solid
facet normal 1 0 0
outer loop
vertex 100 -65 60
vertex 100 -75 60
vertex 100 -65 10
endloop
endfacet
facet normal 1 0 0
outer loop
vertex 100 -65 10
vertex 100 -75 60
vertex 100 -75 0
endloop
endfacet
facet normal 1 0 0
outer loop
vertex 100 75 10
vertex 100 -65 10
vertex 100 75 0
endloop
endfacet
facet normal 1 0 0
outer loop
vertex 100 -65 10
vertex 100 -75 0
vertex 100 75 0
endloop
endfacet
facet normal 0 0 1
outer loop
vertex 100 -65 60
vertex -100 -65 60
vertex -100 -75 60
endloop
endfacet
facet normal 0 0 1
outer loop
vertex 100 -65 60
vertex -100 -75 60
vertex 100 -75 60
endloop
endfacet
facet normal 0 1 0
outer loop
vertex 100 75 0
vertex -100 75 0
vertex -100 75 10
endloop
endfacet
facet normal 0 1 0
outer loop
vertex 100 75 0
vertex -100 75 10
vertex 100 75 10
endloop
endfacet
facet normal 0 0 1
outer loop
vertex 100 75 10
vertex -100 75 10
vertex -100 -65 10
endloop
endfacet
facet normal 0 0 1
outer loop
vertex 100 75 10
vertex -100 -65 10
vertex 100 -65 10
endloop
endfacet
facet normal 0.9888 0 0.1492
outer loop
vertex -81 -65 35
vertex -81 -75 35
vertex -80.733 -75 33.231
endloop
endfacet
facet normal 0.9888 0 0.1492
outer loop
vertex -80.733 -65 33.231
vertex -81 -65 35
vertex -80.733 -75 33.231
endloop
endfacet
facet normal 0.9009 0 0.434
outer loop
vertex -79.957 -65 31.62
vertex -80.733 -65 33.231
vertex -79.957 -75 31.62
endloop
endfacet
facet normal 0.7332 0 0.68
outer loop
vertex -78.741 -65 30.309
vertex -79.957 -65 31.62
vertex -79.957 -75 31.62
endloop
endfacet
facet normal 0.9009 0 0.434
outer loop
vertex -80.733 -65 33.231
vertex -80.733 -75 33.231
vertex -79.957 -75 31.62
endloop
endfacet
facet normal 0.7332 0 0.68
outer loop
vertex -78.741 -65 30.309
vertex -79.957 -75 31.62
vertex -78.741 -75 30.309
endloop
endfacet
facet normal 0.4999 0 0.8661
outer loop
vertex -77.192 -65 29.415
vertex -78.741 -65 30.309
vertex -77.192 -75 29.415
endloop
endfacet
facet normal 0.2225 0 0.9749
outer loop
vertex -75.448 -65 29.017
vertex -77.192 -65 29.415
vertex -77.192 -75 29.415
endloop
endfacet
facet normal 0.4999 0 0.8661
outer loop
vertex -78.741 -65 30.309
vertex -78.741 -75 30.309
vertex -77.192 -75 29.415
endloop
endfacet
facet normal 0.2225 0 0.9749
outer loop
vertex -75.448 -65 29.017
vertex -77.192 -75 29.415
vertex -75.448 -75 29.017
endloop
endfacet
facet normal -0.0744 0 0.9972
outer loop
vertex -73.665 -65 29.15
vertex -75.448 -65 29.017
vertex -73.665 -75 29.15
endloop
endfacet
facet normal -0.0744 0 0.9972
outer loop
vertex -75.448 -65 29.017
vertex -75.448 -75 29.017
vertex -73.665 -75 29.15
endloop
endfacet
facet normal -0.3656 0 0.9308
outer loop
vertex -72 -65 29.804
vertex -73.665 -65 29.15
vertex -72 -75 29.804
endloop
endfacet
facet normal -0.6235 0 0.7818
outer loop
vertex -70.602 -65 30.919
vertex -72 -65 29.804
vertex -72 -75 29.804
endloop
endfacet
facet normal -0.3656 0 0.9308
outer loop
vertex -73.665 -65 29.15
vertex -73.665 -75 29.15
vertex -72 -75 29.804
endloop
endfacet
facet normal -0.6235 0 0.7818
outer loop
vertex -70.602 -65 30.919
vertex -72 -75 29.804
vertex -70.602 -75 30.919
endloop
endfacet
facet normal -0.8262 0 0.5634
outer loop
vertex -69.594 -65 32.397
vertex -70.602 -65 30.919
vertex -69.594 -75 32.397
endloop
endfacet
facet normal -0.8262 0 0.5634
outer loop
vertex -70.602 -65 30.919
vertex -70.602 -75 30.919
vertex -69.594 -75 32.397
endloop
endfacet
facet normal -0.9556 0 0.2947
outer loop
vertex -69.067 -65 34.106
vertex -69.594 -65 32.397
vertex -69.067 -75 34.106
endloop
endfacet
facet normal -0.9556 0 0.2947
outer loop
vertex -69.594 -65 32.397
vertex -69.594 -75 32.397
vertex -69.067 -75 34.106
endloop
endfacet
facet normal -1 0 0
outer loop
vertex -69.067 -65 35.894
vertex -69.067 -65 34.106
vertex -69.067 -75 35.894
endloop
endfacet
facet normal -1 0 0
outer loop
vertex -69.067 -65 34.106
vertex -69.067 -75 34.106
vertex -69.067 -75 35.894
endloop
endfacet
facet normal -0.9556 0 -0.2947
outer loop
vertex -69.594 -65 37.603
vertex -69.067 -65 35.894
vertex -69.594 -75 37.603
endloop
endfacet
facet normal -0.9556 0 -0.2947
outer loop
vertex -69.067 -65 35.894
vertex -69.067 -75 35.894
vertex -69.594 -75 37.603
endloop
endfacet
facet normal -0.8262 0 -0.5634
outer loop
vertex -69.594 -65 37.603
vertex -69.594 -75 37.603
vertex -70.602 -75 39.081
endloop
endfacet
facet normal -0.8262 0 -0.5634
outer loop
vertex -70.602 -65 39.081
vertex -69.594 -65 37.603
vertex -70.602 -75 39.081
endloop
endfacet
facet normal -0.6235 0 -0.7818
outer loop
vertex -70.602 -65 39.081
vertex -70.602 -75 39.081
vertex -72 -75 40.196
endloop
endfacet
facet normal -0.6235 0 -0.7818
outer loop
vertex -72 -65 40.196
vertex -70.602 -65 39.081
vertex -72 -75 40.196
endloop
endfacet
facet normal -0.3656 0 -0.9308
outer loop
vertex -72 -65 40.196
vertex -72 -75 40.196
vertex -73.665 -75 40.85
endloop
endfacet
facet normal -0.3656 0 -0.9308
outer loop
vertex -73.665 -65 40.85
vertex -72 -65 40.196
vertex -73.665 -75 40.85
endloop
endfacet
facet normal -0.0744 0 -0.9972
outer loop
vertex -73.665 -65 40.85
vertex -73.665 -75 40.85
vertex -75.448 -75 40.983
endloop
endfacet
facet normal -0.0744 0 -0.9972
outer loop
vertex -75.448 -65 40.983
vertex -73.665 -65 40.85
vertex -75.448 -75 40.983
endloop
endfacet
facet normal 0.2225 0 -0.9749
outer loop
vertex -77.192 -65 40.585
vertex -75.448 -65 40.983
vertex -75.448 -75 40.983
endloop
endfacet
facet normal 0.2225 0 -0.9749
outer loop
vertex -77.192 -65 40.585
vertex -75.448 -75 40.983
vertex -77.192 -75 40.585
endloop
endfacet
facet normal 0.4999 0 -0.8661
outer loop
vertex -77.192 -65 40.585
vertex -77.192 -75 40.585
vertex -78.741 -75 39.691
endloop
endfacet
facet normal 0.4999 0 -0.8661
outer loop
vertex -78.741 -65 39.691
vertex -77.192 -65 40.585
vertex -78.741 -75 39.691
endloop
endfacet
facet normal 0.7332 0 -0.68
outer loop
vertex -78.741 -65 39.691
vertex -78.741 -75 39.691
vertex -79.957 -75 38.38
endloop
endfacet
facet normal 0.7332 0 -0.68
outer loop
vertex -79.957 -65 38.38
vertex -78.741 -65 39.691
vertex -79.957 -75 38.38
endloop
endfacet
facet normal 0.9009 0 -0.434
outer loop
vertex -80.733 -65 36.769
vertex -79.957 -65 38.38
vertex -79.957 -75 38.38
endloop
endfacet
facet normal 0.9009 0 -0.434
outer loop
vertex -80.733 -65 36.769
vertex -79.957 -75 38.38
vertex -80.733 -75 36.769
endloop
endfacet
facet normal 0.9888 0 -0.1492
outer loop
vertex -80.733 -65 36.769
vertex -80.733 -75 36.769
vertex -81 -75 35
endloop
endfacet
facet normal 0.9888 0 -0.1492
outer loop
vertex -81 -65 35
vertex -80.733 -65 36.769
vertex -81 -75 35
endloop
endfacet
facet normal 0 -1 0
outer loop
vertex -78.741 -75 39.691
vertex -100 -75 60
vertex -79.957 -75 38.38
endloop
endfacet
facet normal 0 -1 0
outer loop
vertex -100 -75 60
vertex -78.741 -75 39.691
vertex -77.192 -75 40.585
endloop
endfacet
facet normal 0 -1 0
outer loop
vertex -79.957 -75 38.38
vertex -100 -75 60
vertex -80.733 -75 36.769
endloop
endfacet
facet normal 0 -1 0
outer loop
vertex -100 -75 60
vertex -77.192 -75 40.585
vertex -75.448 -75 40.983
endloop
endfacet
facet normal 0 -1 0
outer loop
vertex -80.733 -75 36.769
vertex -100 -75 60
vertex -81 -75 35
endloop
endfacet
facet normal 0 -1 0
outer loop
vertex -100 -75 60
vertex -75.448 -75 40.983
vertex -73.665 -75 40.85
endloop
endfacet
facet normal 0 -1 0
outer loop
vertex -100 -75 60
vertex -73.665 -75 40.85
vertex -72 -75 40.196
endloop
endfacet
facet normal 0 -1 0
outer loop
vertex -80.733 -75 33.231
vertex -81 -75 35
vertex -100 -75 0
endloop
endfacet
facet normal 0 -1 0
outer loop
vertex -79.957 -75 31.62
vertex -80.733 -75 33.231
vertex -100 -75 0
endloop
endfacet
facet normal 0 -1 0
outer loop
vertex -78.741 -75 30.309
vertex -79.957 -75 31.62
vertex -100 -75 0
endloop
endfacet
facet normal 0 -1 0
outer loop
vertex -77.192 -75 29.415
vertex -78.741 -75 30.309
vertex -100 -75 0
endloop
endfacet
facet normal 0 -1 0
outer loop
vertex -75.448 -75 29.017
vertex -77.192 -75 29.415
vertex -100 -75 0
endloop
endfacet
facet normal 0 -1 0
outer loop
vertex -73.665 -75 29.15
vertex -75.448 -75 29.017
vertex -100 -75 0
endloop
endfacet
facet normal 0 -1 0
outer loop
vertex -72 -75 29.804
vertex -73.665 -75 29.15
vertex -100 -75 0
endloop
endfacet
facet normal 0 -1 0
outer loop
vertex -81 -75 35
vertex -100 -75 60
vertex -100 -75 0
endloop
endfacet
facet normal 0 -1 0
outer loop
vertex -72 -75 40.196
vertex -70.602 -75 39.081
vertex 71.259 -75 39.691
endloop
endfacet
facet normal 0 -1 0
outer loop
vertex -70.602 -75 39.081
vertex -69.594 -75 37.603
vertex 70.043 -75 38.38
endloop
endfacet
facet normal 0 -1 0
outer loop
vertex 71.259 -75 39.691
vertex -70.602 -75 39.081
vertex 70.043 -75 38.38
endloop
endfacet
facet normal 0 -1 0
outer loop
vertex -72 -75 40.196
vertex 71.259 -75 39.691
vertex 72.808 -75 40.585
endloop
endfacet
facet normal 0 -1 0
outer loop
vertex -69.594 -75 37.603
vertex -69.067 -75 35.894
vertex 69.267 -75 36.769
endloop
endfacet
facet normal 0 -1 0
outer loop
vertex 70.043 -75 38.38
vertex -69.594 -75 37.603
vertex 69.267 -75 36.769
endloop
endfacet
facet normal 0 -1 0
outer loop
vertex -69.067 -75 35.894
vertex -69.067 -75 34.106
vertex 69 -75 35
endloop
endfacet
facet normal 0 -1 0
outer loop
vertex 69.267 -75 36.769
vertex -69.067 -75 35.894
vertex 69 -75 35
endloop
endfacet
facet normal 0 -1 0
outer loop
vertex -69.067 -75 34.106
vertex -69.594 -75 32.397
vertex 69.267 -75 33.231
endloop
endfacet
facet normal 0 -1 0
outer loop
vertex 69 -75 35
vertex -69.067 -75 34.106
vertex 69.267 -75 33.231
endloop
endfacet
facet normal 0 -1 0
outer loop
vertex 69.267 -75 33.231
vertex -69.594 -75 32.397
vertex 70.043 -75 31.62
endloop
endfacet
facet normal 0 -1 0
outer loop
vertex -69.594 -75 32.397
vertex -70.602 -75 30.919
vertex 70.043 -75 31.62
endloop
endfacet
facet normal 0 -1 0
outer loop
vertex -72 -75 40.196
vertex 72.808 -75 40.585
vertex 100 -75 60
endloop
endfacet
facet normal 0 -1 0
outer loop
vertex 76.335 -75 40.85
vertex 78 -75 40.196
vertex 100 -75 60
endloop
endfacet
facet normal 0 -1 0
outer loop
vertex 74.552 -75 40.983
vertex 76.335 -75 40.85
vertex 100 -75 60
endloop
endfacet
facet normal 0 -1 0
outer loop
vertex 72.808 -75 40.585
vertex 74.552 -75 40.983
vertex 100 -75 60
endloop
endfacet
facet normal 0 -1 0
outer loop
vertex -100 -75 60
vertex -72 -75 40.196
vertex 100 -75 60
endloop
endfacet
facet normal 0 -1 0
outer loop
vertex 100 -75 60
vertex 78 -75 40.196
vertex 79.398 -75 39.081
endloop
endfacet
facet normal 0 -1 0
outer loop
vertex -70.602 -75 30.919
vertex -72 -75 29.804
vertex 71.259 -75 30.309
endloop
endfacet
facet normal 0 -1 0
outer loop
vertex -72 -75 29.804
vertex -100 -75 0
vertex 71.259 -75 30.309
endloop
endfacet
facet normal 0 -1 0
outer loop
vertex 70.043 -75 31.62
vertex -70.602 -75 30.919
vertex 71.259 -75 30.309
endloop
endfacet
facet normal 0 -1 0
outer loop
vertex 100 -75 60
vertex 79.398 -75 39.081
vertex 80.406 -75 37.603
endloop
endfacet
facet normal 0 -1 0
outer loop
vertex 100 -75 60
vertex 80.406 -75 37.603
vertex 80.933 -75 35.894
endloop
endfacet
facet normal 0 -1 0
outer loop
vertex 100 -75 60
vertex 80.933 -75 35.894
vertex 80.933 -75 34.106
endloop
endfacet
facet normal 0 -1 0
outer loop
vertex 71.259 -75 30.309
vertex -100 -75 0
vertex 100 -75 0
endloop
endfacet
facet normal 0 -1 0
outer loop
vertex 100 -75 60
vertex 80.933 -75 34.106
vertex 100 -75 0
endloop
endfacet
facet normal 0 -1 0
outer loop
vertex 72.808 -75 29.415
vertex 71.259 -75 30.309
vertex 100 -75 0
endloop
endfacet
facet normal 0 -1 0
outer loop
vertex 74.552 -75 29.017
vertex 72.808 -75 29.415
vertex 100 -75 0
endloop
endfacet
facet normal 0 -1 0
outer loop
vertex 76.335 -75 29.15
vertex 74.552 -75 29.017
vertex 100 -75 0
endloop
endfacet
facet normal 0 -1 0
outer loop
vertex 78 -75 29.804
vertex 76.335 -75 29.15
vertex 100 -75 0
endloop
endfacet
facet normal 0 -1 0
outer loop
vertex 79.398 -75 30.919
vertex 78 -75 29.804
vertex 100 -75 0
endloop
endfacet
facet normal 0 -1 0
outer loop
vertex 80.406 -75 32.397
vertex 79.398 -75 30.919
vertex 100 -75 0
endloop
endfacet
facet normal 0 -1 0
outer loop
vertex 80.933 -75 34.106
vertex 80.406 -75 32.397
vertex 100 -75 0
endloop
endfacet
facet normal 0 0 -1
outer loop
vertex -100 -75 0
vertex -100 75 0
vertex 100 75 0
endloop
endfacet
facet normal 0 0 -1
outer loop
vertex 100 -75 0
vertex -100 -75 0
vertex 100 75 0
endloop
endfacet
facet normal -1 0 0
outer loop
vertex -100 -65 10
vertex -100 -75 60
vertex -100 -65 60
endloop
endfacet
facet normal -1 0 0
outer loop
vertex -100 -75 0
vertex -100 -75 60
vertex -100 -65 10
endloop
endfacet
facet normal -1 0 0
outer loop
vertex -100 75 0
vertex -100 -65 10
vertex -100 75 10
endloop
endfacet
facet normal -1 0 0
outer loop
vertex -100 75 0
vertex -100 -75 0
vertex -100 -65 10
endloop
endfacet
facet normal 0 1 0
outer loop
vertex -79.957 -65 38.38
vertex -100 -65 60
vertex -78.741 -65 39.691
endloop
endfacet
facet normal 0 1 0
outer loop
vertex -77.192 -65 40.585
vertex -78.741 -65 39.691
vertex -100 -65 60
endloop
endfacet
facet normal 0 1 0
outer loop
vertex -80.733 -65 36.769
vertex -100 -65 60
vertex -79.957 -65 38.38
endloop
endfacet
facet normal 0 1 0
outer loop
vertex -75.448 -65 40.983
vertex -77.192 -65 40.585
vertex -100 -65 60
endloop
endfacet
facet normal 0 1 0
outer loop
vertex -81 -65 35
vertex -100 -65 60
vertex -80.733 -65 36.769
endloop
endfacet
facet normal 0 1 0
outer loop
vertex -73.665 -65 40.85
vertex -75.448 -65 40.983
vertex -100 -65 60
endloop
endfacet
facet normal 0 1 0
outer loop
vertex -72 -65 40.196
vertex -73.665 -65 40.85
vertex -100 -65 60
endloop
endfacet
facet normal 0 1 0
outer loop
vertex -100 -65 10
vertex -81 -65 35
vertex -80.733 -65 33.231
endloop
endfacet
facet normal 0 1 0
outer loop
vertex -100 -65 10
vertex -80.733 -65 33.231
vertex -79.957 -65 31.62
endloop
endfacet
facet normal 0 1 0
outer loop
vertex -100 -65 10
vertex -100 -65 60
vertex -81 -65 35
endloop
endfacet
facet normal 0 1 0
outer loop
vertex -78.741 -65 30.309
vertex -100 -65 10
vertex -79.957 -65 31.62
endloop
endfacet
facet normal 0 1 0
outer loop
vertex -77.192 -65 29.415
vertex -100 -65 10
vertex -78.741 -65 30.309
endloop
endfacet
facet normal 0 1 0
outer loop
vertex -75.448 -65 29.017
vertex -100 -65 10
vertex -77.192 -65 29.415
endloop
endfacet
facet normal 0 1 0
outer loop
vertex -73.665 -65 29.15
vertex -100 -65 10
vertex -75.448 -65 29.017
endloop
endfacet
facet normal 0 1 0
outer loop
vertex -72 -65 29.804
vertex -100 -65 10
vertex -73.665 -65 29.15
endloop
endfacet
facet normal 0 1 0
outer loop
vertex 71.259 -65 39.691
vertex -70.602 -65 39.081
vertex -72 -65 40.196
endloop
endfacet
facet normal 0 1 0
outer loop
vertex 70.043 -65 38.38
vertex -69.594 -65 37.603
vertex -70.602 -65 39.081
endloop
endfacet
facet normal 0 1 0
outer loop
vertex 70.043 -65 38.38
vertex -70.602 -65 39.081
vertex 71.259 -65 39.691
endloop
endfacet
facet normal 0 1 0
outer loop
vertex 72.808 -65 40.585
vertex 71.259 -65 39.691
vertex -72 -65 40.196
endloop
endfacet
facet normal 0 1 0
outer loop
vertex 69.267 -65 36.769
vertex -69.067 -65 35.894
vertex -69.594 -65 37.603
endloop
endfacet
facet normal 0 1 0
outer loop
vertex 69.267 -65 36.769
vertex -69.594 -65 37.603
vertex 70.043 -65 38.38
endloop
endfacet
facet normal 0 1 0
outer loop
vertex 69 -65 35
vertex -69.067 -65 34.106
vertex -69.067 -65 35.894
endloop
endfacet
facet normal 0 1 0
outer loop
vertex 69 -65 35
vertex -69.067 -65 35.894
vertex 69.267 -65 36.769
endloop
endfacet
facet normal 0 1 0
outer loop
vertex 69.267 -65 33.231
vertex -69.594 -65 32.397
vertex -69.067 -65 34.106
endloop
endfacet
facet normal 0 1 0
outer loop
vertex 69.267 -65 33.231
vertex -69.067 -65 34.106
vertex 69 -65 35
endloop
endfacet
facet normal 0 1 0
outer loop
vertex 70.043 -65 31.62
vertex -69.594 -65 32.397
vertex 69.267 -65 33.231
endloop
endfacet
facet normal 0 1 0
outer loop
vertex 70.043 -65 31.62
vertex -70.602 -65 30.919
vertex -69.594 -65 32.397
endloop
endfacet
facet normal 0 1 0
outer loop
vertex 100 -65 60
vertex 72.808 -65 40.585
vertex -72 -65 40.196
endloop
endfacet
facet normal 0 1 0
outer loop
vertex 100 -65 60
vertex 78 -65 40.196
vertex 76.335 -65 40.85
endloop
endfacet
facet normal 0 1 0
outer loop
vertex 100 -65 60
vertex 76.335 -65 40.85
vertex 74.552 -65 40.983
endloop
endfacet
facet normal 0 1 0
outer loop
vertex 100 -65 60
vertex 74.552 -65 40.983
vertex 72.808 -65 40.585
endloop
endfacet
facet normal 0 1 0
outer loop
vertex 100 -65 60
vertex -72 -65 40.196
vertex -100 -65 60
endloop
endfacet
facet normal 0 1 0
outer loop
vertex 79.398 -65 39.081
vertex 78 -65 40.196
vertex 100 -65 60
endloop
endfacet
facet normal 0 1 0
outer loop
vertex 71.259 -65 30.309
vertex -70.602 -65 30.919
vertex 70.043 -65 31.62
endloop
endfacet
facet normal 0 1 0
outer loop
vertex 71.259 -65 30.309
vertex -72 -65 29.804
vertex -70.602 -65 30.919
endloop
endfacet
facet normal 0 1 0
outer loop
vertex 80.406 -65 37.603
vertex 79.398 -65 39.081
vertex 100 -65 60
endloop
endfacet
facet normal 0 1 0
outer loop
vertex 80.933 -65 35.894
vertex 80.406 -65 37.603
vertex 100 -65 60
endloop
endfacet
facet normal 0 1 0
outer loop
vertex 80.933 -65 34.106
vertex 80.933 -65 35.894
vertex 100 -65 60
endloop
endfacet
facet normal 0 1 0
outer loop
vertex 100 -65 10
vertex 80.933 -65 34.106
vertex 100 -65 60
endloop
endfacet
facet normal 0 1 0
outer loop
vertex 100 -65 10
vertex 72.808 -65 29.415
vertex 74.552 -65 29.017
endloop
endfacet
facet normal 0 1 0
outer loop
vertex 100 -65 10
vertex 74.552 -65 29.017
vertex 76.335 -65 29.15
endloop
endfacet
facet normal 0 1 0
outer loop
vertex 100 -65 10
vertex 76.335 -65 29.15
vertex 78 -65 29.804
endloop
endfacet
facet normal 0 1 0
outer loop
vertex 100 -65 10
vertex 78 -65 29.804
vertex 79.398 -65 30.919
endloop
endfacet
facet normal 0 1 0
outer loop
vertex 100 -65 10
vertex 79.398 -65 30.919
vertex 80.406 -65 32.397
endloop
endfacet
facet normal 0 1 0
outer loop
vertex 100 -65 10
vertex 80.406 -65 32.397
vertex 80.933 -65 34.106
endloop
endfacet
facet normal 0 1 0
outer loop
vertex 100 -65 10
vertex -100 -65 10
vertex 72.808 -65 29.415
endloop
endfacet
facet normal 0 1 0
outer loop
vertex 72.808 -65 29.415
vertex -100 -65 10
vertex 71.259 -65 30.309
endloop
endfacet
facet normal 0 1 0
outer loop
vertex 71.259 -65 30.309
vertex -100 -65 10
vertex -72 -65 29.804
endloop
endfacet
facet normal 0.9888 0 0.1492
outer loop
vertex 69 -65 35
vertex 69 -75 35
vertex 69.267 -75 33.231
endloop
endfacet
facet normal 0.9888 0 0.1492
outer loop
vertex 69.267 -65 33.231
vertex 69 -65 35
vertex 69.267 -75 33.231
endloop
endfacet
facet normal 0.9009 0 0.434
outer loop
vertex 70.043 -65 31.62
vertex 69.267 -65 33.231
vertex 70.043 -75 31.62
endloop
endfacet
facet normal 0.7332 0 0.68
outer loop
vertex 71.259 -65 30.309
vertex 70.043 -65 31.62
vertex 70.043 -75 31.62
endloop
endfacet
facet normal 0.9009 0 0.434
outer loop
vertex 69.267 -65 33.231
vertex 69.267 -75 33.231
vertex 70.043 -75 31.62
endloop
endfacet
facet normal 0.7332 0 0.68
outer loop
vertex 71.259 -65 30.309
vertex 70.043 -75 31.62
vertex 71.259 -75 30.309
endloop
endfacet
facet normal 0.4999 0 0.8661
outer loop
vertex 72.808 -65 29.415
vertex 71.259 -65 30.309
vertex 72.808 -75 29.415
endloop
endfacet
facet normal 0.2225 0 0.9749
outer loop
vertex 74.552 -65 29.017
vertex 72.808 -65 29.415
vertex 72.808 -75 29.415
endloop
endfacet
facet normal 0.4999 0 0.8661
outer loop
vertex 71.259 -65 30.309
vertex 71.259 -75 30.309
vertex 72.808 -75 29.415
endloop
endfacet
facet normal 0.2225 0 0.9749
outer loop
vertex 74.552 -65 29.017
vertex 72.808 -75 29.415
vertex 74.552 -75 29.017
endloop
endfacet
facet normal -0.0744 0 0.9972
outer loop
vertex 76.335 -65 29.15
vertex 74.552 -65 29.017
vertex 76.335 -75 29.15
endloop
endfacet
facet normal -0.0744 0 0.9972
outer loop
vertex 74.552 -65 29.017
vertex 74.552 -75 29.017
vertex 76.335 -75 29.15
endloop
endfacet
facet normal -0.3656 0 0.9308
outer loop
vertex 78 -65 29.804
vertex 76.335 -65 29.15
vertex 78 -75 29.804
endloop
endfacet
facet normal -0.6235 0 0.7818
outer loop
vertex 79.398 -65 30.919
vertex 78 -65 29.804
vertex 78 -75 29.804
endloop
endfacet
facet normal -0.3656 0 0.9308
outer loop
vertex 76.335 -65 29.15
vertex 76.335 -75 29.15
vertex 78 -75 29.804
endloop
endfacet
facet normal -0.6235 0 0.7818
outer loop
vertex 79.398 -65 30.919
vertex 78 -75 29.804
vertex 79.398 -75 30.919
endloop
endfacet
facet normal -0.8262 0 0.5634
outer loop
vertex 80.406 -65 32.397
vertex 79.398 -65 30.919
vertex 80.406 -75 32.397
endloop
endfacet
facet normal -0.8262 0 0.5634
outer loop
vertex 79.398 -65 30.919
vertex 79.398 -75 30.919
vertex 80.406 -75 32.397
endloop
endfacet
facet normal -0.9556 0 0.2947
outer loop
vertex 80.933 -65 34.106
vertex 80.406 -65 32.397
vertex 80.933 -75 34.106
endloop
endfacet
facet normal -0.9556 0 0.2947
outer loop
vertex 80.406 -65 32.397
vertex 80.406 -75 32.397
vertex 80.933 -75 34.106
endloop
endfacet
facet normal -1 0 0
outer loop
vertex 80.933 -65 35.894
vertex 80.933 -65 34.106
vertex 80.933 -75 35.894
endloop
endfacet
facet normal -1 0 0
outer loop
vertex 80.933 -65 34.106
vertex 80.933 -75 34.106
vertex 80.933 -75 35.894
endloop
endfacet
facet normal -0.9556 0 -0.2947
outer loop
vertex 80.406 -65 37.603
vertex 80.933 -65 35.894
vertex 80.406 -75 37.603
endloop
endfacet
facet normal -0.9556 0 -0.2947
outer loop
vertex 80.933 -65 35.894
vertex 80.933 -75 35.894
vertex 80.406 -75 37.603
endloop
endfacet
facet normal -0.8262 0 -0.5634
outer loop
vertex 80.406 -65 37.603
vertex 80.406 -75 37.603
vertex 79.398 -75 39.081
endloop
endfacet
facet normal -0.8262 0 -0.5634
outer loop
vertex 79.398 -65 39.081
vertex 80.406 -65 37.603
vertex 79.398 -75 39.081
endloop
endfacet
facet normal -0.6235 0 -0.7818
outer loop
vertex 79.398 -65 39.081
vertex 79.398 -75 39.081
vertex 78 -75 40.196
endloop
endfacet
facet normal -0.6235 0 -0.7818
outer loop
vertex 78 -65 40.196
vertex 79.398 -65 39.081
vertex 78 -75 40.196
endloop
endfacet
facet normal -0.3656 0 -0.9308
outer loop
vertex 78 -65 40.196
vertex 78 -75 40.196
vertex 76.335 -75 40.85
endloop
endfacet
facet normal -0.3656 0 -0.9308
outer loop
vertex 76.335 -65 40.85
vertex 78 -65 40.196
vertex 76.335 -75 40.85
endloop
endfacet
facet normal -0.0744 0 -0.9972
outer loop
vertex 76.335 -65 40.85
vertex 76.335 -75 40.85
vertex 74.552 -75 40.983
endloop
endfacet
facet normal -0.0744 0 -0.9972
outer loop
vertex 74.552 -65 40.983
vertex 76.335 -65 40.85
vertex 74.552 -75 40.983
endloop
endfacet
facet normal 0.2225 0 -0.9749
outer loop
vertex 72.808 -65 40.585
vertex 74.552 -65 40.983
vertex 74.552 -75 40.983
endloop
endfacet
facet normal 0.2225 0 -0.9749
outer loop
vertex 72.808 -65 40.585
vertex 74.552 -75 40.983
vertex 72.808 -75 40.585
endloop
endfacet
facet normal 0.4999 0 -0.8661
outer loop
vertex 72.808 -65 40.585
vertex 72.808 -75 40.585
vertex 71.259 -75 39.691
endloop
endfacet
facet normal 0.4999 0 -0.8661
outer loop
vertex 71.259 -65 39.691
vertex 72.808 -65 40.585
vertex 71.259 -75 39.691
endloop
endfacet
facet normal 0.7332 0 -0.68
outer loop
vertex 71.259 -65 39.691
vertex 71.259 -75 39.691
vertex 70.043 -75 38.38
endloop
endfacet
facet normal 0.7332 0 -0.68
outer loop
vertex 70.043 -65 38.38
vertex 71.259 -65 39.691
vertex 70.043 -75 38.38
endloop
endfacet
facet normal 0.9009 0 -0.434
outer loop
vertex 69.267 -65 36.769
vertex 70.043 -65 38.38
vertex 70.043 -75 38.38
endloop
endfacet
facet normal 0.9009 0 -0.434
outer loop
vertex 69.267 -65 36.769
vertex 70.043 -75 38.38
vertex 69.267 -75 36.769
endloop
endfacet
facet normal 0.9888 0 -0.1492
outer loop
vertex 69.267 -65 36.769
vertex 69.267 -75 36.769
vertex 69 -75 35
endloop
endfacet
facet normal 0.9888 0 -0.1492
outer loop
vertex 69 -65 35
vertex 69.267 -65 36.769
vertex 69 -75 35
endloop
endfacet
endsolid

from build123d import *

# Parameters (mm, degrees)
SZKIC1_W                    = 200
SZKIC1_H                    = 150
DODANIE_WYCI_GNI_CIE1_DEPTH = 10
SZKIC2_W                    = 200
SZKIC2_H                    = 10
DODANIE_WYCI_GNI_CIE2_DEPTH = 50
OTW_R_POD_RUB_M101_D        = 12
SZYK_LINIOWY2_COUNT         = 2
SZYK_LINIOWY2_PITCH         = 150


with BuildPart() as part:
    # Szkic1 → Dodanie-wyciągnięcie1 (new body)
    with BuildSketch(Plane.XY):
        Rectangle(SZKIC1_W, SZKIC1_H)
    extrude(amount=DODANIE_WYCI_GNI_CIE1_DEPTH)

    # Szkic2 → Dodanie-wyciągnięcie2 (add)
    with BuildSketch(Plane.XY.offset(10)):
        with Locations((0, -70)):
            Rectangle(SZKIC2_W, SZKIC2_H)
    extrude(amount=DODANIE_WYCI_GNI_CIE2_DEPTH)

    # Otwór pod śrubę M101 (through all)
    with Locations(Plane(origin=(0, -65, 0), x_dir=(1, 0, 0), z_dir=(0, 1, 0))):
        with Locations((-75, -35)):
            otw_r_pod_rub_m101 = Hole(OTW_R_POD_RUB_M101_D / 2)

    # Szyk liniowy2: Otwór pod śrubę M101 ×2
    with Locations(*[(i * SZYK_LINIOWY2_PITCH, 0, 0) for i in range(1, SZYK_LINIOWY2_COUNT)]):
        add(otw_r_pod_rub_m101, mode=Mode.SUBTRACT)


solid = part.part
